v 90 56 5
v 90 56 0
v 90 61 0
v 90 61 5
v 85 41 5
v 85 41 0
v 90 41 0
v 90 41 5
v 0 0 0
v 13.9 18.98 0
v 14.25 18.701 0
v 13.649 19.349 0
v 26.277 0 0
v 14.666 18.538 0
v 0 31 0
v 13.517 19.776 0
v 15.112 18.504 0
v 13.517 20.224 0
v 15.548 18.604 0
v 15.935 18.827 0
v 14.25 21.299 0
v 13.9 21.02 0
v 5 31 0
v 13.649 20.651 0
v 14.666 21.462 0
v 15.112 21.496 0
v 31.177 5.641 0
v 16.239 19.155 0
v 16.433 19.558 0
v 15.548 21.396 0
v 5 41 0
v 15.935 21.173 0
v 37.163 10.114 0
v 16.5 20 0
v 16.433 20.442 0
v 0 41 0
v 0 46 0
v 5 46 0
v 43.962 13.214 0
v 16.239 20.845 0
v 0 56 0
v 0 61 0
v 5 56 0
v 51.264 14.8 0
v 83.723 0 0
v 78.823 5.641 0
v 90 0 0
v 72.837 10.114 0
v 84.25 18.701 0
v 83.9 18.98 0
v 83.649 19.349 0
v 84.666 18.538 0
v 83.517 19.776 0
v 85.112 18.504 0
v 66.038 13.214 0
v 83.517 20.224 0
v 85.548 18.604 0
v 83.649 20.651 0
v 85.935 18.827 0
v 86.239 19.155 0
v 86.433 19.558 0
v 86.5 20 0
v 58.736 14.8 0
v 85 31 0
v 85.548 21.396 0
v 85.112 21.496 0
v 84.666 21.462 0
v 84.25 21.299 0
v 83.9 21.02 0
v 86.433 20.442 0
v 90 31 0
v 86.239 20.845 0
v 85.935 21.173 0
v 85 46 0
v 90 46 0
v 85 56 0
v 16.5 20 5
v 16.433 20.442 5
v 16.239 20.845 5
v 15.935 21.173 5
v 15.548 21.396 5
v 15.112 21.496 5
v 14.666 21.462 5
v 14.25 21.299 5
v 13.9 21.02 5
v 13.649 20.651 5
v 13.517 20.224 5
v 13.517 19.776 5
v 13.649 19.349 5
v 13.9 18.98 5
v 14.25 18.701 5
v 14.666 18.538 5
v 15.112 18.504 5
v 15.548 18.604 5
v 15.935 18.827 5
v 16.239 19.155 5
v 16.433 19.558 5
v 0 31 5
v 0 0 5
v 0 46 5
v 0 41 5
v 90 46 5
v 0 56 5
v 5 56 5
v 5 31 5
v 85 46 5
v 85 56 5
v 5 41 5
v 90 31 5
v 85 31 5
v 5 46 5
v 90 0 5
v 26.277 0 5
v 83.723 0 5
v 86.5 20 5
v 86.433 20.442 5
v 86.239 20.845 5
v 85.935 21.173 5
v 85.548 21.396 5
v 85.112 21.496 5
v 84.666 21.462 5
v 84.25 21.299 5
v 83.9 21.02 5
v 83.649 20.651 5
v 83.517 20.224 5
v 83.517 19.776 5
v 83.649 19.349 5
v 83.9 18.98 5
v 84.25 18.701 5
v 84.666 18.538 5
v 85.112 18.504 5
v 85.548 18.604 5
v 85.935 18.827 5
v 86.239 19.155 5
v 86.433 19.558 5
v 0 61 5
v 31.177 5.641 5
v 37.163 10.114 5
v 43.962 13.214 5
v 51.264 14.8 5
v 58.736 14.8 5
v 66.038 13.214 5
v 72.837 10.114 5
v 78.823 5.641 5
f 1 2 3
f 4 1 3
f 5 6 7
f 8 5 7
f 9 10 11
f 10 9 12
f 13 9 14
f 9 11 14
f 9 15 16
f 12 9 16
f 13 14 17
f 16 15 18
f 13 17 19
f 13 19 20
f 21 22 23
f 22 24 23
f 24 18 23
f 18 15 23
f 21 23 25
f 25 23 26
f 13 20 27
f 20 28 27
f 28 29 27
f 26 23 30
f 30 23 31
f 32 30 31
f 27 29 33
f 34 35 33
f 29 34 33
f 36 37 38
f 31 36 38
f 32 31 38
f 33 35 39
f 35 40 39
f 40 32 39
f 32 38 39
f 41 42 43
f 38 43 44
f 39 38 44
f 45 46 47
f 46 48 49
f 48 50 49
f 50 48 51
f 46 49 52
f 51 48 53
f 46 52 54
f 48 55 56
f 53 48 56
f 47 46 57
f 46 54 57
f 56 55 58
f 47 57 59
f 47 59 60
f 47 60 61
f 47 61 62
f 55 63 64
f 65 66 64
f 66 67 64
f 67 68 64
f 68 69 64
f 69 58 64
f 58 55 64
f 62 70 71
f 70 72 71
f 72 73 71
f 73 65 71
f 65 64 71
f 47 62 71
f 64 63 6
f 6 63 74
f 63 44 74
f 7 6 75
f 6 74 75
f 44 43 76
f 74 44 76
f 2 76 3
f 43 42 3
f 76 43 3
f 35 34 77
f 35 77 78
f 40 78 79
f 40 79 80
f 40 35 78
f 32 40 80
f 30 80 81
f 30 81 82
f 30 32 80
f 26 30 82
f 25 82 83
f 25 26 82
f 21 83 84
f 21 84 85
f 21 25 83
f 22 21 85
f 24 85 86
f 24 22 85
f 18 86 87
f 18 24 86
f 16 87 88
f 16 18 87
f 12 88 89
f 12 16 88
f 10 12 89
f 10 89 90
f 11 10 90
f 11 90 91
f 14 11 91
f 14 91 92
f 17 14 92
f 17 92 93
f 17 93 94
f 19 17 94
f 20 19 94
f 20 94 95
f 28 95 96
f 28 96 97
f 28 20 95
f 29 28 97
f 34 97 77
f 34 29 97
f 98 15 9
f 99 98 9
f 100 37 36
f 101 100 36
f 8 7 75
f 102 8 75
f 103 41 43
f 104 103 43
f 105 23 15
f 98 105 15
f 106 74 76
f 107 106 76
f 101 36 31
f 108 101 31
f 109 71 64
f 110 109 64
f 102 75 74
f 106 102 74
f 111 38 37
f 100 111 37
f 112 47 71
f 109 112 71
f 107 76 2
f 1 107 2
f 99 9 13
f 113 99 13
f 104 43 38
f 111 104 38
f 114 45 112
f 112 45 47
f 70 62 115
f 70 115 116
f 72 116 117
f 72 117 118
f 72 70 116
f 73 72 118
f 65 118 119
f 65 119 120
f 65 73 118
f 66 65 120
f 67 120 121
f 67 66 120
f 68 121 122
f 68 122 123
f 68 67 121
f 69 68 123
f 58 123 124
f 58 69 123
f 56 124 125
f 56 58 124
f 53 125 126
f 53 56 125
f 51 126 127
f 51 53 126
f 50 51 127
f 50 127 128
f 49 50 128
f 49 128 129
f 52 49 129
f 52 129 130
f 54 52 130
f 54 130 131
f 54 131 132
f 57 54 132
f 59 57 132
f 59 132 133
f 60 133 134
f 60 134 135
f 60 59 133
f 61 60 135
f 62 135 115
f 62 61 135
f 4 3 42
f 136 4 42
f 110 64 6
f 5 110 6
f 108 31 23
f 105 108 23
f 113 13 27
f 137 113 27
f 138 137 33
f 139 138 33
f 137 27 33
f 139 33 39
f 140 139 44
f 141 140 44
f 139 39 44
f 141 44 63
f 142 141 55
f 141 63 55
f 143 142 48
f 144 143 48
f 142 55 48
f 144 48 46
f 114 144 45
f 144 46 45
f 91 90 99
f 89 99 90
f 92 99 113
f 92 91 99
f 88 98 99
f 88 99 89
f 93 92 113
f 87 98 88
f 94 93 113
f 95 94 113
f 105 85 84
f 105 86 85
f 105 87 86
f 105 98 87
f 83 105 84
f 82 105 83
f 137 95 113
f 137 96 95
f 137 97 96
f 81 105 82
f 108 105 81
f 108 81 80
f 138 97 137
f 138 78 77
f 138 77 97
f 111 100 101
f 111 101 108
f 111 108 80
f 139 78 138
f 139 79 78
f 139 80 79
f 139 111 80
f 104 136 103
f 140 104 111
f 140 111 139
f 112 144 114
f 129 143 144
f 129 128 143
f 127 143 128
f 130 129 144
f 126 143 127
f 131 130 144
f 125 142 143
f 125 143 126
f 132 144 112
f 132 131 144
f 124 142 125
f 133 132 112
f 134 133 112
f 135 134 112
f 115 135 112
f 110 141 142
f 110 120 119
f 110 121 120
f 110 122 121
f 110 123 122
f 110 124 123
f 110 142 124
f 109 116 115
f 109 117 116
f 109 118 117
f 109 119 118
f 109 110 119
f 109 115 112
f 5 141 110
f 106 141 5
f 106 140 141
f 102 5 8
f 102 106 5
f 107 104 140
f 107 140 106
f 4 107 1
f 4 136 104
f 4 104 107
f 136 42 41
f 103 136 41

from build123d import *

# Parameters (mm, degrees)
ESQUISSE1_R        = 1.5
BOSS_EXTRU_1_DEPTH = 5


with BuildPart() as part:
    # Esquisse1 → Boss.-Extru.1 (new body)
    with BuildSketch(Plane.XY):
        with BuildLine():
            Line((0, 0), (26.277186767, 0))
            ThreePointArc((26.277186767, 0), (55, 15), (83.722813233, 0))
            Line((83.722813233, 0), (90, 0))
            Line((90, 0), (90, 31))
            Line((90, 31), (85, 31))
            Line((85, 31), (85, 41))
            Line((85, 41), (90, 41))
            Line((90, 41), (90, 46))
            Line((90, 46), (85, 46))
            Line((85, 46), (85, 56))
            Line((85, 56), (90, 56))
            Line((90, 56), (90, 61))
            Line((90, 61), (0, 61))
            Line((0, 61), (0, 56))
            Line((0, 56), (5, 56))
            Line((5, 56), (5, 46))
            Line((5, 46), (0, 46))
            Line((0, 46), (0, 41))
            Line((0, 41), (5, 41))
            Line((5, 41), (5, 31))
            Line((5, 31), (0, 31))
            Line((0, 31), (0, 0))
        make_face()
        with Locations((85, 20)):
            Circle(ESQUISSE1_R, mode=Mode.SUBTRACT)
        with Locations((15, 20)):
            Circle(ESQUISSE1_R, mode=Mode.SUBTRACT)
    extrude(amount=BOSS_EXTRU_1_DEPTH)


solid = part.part
